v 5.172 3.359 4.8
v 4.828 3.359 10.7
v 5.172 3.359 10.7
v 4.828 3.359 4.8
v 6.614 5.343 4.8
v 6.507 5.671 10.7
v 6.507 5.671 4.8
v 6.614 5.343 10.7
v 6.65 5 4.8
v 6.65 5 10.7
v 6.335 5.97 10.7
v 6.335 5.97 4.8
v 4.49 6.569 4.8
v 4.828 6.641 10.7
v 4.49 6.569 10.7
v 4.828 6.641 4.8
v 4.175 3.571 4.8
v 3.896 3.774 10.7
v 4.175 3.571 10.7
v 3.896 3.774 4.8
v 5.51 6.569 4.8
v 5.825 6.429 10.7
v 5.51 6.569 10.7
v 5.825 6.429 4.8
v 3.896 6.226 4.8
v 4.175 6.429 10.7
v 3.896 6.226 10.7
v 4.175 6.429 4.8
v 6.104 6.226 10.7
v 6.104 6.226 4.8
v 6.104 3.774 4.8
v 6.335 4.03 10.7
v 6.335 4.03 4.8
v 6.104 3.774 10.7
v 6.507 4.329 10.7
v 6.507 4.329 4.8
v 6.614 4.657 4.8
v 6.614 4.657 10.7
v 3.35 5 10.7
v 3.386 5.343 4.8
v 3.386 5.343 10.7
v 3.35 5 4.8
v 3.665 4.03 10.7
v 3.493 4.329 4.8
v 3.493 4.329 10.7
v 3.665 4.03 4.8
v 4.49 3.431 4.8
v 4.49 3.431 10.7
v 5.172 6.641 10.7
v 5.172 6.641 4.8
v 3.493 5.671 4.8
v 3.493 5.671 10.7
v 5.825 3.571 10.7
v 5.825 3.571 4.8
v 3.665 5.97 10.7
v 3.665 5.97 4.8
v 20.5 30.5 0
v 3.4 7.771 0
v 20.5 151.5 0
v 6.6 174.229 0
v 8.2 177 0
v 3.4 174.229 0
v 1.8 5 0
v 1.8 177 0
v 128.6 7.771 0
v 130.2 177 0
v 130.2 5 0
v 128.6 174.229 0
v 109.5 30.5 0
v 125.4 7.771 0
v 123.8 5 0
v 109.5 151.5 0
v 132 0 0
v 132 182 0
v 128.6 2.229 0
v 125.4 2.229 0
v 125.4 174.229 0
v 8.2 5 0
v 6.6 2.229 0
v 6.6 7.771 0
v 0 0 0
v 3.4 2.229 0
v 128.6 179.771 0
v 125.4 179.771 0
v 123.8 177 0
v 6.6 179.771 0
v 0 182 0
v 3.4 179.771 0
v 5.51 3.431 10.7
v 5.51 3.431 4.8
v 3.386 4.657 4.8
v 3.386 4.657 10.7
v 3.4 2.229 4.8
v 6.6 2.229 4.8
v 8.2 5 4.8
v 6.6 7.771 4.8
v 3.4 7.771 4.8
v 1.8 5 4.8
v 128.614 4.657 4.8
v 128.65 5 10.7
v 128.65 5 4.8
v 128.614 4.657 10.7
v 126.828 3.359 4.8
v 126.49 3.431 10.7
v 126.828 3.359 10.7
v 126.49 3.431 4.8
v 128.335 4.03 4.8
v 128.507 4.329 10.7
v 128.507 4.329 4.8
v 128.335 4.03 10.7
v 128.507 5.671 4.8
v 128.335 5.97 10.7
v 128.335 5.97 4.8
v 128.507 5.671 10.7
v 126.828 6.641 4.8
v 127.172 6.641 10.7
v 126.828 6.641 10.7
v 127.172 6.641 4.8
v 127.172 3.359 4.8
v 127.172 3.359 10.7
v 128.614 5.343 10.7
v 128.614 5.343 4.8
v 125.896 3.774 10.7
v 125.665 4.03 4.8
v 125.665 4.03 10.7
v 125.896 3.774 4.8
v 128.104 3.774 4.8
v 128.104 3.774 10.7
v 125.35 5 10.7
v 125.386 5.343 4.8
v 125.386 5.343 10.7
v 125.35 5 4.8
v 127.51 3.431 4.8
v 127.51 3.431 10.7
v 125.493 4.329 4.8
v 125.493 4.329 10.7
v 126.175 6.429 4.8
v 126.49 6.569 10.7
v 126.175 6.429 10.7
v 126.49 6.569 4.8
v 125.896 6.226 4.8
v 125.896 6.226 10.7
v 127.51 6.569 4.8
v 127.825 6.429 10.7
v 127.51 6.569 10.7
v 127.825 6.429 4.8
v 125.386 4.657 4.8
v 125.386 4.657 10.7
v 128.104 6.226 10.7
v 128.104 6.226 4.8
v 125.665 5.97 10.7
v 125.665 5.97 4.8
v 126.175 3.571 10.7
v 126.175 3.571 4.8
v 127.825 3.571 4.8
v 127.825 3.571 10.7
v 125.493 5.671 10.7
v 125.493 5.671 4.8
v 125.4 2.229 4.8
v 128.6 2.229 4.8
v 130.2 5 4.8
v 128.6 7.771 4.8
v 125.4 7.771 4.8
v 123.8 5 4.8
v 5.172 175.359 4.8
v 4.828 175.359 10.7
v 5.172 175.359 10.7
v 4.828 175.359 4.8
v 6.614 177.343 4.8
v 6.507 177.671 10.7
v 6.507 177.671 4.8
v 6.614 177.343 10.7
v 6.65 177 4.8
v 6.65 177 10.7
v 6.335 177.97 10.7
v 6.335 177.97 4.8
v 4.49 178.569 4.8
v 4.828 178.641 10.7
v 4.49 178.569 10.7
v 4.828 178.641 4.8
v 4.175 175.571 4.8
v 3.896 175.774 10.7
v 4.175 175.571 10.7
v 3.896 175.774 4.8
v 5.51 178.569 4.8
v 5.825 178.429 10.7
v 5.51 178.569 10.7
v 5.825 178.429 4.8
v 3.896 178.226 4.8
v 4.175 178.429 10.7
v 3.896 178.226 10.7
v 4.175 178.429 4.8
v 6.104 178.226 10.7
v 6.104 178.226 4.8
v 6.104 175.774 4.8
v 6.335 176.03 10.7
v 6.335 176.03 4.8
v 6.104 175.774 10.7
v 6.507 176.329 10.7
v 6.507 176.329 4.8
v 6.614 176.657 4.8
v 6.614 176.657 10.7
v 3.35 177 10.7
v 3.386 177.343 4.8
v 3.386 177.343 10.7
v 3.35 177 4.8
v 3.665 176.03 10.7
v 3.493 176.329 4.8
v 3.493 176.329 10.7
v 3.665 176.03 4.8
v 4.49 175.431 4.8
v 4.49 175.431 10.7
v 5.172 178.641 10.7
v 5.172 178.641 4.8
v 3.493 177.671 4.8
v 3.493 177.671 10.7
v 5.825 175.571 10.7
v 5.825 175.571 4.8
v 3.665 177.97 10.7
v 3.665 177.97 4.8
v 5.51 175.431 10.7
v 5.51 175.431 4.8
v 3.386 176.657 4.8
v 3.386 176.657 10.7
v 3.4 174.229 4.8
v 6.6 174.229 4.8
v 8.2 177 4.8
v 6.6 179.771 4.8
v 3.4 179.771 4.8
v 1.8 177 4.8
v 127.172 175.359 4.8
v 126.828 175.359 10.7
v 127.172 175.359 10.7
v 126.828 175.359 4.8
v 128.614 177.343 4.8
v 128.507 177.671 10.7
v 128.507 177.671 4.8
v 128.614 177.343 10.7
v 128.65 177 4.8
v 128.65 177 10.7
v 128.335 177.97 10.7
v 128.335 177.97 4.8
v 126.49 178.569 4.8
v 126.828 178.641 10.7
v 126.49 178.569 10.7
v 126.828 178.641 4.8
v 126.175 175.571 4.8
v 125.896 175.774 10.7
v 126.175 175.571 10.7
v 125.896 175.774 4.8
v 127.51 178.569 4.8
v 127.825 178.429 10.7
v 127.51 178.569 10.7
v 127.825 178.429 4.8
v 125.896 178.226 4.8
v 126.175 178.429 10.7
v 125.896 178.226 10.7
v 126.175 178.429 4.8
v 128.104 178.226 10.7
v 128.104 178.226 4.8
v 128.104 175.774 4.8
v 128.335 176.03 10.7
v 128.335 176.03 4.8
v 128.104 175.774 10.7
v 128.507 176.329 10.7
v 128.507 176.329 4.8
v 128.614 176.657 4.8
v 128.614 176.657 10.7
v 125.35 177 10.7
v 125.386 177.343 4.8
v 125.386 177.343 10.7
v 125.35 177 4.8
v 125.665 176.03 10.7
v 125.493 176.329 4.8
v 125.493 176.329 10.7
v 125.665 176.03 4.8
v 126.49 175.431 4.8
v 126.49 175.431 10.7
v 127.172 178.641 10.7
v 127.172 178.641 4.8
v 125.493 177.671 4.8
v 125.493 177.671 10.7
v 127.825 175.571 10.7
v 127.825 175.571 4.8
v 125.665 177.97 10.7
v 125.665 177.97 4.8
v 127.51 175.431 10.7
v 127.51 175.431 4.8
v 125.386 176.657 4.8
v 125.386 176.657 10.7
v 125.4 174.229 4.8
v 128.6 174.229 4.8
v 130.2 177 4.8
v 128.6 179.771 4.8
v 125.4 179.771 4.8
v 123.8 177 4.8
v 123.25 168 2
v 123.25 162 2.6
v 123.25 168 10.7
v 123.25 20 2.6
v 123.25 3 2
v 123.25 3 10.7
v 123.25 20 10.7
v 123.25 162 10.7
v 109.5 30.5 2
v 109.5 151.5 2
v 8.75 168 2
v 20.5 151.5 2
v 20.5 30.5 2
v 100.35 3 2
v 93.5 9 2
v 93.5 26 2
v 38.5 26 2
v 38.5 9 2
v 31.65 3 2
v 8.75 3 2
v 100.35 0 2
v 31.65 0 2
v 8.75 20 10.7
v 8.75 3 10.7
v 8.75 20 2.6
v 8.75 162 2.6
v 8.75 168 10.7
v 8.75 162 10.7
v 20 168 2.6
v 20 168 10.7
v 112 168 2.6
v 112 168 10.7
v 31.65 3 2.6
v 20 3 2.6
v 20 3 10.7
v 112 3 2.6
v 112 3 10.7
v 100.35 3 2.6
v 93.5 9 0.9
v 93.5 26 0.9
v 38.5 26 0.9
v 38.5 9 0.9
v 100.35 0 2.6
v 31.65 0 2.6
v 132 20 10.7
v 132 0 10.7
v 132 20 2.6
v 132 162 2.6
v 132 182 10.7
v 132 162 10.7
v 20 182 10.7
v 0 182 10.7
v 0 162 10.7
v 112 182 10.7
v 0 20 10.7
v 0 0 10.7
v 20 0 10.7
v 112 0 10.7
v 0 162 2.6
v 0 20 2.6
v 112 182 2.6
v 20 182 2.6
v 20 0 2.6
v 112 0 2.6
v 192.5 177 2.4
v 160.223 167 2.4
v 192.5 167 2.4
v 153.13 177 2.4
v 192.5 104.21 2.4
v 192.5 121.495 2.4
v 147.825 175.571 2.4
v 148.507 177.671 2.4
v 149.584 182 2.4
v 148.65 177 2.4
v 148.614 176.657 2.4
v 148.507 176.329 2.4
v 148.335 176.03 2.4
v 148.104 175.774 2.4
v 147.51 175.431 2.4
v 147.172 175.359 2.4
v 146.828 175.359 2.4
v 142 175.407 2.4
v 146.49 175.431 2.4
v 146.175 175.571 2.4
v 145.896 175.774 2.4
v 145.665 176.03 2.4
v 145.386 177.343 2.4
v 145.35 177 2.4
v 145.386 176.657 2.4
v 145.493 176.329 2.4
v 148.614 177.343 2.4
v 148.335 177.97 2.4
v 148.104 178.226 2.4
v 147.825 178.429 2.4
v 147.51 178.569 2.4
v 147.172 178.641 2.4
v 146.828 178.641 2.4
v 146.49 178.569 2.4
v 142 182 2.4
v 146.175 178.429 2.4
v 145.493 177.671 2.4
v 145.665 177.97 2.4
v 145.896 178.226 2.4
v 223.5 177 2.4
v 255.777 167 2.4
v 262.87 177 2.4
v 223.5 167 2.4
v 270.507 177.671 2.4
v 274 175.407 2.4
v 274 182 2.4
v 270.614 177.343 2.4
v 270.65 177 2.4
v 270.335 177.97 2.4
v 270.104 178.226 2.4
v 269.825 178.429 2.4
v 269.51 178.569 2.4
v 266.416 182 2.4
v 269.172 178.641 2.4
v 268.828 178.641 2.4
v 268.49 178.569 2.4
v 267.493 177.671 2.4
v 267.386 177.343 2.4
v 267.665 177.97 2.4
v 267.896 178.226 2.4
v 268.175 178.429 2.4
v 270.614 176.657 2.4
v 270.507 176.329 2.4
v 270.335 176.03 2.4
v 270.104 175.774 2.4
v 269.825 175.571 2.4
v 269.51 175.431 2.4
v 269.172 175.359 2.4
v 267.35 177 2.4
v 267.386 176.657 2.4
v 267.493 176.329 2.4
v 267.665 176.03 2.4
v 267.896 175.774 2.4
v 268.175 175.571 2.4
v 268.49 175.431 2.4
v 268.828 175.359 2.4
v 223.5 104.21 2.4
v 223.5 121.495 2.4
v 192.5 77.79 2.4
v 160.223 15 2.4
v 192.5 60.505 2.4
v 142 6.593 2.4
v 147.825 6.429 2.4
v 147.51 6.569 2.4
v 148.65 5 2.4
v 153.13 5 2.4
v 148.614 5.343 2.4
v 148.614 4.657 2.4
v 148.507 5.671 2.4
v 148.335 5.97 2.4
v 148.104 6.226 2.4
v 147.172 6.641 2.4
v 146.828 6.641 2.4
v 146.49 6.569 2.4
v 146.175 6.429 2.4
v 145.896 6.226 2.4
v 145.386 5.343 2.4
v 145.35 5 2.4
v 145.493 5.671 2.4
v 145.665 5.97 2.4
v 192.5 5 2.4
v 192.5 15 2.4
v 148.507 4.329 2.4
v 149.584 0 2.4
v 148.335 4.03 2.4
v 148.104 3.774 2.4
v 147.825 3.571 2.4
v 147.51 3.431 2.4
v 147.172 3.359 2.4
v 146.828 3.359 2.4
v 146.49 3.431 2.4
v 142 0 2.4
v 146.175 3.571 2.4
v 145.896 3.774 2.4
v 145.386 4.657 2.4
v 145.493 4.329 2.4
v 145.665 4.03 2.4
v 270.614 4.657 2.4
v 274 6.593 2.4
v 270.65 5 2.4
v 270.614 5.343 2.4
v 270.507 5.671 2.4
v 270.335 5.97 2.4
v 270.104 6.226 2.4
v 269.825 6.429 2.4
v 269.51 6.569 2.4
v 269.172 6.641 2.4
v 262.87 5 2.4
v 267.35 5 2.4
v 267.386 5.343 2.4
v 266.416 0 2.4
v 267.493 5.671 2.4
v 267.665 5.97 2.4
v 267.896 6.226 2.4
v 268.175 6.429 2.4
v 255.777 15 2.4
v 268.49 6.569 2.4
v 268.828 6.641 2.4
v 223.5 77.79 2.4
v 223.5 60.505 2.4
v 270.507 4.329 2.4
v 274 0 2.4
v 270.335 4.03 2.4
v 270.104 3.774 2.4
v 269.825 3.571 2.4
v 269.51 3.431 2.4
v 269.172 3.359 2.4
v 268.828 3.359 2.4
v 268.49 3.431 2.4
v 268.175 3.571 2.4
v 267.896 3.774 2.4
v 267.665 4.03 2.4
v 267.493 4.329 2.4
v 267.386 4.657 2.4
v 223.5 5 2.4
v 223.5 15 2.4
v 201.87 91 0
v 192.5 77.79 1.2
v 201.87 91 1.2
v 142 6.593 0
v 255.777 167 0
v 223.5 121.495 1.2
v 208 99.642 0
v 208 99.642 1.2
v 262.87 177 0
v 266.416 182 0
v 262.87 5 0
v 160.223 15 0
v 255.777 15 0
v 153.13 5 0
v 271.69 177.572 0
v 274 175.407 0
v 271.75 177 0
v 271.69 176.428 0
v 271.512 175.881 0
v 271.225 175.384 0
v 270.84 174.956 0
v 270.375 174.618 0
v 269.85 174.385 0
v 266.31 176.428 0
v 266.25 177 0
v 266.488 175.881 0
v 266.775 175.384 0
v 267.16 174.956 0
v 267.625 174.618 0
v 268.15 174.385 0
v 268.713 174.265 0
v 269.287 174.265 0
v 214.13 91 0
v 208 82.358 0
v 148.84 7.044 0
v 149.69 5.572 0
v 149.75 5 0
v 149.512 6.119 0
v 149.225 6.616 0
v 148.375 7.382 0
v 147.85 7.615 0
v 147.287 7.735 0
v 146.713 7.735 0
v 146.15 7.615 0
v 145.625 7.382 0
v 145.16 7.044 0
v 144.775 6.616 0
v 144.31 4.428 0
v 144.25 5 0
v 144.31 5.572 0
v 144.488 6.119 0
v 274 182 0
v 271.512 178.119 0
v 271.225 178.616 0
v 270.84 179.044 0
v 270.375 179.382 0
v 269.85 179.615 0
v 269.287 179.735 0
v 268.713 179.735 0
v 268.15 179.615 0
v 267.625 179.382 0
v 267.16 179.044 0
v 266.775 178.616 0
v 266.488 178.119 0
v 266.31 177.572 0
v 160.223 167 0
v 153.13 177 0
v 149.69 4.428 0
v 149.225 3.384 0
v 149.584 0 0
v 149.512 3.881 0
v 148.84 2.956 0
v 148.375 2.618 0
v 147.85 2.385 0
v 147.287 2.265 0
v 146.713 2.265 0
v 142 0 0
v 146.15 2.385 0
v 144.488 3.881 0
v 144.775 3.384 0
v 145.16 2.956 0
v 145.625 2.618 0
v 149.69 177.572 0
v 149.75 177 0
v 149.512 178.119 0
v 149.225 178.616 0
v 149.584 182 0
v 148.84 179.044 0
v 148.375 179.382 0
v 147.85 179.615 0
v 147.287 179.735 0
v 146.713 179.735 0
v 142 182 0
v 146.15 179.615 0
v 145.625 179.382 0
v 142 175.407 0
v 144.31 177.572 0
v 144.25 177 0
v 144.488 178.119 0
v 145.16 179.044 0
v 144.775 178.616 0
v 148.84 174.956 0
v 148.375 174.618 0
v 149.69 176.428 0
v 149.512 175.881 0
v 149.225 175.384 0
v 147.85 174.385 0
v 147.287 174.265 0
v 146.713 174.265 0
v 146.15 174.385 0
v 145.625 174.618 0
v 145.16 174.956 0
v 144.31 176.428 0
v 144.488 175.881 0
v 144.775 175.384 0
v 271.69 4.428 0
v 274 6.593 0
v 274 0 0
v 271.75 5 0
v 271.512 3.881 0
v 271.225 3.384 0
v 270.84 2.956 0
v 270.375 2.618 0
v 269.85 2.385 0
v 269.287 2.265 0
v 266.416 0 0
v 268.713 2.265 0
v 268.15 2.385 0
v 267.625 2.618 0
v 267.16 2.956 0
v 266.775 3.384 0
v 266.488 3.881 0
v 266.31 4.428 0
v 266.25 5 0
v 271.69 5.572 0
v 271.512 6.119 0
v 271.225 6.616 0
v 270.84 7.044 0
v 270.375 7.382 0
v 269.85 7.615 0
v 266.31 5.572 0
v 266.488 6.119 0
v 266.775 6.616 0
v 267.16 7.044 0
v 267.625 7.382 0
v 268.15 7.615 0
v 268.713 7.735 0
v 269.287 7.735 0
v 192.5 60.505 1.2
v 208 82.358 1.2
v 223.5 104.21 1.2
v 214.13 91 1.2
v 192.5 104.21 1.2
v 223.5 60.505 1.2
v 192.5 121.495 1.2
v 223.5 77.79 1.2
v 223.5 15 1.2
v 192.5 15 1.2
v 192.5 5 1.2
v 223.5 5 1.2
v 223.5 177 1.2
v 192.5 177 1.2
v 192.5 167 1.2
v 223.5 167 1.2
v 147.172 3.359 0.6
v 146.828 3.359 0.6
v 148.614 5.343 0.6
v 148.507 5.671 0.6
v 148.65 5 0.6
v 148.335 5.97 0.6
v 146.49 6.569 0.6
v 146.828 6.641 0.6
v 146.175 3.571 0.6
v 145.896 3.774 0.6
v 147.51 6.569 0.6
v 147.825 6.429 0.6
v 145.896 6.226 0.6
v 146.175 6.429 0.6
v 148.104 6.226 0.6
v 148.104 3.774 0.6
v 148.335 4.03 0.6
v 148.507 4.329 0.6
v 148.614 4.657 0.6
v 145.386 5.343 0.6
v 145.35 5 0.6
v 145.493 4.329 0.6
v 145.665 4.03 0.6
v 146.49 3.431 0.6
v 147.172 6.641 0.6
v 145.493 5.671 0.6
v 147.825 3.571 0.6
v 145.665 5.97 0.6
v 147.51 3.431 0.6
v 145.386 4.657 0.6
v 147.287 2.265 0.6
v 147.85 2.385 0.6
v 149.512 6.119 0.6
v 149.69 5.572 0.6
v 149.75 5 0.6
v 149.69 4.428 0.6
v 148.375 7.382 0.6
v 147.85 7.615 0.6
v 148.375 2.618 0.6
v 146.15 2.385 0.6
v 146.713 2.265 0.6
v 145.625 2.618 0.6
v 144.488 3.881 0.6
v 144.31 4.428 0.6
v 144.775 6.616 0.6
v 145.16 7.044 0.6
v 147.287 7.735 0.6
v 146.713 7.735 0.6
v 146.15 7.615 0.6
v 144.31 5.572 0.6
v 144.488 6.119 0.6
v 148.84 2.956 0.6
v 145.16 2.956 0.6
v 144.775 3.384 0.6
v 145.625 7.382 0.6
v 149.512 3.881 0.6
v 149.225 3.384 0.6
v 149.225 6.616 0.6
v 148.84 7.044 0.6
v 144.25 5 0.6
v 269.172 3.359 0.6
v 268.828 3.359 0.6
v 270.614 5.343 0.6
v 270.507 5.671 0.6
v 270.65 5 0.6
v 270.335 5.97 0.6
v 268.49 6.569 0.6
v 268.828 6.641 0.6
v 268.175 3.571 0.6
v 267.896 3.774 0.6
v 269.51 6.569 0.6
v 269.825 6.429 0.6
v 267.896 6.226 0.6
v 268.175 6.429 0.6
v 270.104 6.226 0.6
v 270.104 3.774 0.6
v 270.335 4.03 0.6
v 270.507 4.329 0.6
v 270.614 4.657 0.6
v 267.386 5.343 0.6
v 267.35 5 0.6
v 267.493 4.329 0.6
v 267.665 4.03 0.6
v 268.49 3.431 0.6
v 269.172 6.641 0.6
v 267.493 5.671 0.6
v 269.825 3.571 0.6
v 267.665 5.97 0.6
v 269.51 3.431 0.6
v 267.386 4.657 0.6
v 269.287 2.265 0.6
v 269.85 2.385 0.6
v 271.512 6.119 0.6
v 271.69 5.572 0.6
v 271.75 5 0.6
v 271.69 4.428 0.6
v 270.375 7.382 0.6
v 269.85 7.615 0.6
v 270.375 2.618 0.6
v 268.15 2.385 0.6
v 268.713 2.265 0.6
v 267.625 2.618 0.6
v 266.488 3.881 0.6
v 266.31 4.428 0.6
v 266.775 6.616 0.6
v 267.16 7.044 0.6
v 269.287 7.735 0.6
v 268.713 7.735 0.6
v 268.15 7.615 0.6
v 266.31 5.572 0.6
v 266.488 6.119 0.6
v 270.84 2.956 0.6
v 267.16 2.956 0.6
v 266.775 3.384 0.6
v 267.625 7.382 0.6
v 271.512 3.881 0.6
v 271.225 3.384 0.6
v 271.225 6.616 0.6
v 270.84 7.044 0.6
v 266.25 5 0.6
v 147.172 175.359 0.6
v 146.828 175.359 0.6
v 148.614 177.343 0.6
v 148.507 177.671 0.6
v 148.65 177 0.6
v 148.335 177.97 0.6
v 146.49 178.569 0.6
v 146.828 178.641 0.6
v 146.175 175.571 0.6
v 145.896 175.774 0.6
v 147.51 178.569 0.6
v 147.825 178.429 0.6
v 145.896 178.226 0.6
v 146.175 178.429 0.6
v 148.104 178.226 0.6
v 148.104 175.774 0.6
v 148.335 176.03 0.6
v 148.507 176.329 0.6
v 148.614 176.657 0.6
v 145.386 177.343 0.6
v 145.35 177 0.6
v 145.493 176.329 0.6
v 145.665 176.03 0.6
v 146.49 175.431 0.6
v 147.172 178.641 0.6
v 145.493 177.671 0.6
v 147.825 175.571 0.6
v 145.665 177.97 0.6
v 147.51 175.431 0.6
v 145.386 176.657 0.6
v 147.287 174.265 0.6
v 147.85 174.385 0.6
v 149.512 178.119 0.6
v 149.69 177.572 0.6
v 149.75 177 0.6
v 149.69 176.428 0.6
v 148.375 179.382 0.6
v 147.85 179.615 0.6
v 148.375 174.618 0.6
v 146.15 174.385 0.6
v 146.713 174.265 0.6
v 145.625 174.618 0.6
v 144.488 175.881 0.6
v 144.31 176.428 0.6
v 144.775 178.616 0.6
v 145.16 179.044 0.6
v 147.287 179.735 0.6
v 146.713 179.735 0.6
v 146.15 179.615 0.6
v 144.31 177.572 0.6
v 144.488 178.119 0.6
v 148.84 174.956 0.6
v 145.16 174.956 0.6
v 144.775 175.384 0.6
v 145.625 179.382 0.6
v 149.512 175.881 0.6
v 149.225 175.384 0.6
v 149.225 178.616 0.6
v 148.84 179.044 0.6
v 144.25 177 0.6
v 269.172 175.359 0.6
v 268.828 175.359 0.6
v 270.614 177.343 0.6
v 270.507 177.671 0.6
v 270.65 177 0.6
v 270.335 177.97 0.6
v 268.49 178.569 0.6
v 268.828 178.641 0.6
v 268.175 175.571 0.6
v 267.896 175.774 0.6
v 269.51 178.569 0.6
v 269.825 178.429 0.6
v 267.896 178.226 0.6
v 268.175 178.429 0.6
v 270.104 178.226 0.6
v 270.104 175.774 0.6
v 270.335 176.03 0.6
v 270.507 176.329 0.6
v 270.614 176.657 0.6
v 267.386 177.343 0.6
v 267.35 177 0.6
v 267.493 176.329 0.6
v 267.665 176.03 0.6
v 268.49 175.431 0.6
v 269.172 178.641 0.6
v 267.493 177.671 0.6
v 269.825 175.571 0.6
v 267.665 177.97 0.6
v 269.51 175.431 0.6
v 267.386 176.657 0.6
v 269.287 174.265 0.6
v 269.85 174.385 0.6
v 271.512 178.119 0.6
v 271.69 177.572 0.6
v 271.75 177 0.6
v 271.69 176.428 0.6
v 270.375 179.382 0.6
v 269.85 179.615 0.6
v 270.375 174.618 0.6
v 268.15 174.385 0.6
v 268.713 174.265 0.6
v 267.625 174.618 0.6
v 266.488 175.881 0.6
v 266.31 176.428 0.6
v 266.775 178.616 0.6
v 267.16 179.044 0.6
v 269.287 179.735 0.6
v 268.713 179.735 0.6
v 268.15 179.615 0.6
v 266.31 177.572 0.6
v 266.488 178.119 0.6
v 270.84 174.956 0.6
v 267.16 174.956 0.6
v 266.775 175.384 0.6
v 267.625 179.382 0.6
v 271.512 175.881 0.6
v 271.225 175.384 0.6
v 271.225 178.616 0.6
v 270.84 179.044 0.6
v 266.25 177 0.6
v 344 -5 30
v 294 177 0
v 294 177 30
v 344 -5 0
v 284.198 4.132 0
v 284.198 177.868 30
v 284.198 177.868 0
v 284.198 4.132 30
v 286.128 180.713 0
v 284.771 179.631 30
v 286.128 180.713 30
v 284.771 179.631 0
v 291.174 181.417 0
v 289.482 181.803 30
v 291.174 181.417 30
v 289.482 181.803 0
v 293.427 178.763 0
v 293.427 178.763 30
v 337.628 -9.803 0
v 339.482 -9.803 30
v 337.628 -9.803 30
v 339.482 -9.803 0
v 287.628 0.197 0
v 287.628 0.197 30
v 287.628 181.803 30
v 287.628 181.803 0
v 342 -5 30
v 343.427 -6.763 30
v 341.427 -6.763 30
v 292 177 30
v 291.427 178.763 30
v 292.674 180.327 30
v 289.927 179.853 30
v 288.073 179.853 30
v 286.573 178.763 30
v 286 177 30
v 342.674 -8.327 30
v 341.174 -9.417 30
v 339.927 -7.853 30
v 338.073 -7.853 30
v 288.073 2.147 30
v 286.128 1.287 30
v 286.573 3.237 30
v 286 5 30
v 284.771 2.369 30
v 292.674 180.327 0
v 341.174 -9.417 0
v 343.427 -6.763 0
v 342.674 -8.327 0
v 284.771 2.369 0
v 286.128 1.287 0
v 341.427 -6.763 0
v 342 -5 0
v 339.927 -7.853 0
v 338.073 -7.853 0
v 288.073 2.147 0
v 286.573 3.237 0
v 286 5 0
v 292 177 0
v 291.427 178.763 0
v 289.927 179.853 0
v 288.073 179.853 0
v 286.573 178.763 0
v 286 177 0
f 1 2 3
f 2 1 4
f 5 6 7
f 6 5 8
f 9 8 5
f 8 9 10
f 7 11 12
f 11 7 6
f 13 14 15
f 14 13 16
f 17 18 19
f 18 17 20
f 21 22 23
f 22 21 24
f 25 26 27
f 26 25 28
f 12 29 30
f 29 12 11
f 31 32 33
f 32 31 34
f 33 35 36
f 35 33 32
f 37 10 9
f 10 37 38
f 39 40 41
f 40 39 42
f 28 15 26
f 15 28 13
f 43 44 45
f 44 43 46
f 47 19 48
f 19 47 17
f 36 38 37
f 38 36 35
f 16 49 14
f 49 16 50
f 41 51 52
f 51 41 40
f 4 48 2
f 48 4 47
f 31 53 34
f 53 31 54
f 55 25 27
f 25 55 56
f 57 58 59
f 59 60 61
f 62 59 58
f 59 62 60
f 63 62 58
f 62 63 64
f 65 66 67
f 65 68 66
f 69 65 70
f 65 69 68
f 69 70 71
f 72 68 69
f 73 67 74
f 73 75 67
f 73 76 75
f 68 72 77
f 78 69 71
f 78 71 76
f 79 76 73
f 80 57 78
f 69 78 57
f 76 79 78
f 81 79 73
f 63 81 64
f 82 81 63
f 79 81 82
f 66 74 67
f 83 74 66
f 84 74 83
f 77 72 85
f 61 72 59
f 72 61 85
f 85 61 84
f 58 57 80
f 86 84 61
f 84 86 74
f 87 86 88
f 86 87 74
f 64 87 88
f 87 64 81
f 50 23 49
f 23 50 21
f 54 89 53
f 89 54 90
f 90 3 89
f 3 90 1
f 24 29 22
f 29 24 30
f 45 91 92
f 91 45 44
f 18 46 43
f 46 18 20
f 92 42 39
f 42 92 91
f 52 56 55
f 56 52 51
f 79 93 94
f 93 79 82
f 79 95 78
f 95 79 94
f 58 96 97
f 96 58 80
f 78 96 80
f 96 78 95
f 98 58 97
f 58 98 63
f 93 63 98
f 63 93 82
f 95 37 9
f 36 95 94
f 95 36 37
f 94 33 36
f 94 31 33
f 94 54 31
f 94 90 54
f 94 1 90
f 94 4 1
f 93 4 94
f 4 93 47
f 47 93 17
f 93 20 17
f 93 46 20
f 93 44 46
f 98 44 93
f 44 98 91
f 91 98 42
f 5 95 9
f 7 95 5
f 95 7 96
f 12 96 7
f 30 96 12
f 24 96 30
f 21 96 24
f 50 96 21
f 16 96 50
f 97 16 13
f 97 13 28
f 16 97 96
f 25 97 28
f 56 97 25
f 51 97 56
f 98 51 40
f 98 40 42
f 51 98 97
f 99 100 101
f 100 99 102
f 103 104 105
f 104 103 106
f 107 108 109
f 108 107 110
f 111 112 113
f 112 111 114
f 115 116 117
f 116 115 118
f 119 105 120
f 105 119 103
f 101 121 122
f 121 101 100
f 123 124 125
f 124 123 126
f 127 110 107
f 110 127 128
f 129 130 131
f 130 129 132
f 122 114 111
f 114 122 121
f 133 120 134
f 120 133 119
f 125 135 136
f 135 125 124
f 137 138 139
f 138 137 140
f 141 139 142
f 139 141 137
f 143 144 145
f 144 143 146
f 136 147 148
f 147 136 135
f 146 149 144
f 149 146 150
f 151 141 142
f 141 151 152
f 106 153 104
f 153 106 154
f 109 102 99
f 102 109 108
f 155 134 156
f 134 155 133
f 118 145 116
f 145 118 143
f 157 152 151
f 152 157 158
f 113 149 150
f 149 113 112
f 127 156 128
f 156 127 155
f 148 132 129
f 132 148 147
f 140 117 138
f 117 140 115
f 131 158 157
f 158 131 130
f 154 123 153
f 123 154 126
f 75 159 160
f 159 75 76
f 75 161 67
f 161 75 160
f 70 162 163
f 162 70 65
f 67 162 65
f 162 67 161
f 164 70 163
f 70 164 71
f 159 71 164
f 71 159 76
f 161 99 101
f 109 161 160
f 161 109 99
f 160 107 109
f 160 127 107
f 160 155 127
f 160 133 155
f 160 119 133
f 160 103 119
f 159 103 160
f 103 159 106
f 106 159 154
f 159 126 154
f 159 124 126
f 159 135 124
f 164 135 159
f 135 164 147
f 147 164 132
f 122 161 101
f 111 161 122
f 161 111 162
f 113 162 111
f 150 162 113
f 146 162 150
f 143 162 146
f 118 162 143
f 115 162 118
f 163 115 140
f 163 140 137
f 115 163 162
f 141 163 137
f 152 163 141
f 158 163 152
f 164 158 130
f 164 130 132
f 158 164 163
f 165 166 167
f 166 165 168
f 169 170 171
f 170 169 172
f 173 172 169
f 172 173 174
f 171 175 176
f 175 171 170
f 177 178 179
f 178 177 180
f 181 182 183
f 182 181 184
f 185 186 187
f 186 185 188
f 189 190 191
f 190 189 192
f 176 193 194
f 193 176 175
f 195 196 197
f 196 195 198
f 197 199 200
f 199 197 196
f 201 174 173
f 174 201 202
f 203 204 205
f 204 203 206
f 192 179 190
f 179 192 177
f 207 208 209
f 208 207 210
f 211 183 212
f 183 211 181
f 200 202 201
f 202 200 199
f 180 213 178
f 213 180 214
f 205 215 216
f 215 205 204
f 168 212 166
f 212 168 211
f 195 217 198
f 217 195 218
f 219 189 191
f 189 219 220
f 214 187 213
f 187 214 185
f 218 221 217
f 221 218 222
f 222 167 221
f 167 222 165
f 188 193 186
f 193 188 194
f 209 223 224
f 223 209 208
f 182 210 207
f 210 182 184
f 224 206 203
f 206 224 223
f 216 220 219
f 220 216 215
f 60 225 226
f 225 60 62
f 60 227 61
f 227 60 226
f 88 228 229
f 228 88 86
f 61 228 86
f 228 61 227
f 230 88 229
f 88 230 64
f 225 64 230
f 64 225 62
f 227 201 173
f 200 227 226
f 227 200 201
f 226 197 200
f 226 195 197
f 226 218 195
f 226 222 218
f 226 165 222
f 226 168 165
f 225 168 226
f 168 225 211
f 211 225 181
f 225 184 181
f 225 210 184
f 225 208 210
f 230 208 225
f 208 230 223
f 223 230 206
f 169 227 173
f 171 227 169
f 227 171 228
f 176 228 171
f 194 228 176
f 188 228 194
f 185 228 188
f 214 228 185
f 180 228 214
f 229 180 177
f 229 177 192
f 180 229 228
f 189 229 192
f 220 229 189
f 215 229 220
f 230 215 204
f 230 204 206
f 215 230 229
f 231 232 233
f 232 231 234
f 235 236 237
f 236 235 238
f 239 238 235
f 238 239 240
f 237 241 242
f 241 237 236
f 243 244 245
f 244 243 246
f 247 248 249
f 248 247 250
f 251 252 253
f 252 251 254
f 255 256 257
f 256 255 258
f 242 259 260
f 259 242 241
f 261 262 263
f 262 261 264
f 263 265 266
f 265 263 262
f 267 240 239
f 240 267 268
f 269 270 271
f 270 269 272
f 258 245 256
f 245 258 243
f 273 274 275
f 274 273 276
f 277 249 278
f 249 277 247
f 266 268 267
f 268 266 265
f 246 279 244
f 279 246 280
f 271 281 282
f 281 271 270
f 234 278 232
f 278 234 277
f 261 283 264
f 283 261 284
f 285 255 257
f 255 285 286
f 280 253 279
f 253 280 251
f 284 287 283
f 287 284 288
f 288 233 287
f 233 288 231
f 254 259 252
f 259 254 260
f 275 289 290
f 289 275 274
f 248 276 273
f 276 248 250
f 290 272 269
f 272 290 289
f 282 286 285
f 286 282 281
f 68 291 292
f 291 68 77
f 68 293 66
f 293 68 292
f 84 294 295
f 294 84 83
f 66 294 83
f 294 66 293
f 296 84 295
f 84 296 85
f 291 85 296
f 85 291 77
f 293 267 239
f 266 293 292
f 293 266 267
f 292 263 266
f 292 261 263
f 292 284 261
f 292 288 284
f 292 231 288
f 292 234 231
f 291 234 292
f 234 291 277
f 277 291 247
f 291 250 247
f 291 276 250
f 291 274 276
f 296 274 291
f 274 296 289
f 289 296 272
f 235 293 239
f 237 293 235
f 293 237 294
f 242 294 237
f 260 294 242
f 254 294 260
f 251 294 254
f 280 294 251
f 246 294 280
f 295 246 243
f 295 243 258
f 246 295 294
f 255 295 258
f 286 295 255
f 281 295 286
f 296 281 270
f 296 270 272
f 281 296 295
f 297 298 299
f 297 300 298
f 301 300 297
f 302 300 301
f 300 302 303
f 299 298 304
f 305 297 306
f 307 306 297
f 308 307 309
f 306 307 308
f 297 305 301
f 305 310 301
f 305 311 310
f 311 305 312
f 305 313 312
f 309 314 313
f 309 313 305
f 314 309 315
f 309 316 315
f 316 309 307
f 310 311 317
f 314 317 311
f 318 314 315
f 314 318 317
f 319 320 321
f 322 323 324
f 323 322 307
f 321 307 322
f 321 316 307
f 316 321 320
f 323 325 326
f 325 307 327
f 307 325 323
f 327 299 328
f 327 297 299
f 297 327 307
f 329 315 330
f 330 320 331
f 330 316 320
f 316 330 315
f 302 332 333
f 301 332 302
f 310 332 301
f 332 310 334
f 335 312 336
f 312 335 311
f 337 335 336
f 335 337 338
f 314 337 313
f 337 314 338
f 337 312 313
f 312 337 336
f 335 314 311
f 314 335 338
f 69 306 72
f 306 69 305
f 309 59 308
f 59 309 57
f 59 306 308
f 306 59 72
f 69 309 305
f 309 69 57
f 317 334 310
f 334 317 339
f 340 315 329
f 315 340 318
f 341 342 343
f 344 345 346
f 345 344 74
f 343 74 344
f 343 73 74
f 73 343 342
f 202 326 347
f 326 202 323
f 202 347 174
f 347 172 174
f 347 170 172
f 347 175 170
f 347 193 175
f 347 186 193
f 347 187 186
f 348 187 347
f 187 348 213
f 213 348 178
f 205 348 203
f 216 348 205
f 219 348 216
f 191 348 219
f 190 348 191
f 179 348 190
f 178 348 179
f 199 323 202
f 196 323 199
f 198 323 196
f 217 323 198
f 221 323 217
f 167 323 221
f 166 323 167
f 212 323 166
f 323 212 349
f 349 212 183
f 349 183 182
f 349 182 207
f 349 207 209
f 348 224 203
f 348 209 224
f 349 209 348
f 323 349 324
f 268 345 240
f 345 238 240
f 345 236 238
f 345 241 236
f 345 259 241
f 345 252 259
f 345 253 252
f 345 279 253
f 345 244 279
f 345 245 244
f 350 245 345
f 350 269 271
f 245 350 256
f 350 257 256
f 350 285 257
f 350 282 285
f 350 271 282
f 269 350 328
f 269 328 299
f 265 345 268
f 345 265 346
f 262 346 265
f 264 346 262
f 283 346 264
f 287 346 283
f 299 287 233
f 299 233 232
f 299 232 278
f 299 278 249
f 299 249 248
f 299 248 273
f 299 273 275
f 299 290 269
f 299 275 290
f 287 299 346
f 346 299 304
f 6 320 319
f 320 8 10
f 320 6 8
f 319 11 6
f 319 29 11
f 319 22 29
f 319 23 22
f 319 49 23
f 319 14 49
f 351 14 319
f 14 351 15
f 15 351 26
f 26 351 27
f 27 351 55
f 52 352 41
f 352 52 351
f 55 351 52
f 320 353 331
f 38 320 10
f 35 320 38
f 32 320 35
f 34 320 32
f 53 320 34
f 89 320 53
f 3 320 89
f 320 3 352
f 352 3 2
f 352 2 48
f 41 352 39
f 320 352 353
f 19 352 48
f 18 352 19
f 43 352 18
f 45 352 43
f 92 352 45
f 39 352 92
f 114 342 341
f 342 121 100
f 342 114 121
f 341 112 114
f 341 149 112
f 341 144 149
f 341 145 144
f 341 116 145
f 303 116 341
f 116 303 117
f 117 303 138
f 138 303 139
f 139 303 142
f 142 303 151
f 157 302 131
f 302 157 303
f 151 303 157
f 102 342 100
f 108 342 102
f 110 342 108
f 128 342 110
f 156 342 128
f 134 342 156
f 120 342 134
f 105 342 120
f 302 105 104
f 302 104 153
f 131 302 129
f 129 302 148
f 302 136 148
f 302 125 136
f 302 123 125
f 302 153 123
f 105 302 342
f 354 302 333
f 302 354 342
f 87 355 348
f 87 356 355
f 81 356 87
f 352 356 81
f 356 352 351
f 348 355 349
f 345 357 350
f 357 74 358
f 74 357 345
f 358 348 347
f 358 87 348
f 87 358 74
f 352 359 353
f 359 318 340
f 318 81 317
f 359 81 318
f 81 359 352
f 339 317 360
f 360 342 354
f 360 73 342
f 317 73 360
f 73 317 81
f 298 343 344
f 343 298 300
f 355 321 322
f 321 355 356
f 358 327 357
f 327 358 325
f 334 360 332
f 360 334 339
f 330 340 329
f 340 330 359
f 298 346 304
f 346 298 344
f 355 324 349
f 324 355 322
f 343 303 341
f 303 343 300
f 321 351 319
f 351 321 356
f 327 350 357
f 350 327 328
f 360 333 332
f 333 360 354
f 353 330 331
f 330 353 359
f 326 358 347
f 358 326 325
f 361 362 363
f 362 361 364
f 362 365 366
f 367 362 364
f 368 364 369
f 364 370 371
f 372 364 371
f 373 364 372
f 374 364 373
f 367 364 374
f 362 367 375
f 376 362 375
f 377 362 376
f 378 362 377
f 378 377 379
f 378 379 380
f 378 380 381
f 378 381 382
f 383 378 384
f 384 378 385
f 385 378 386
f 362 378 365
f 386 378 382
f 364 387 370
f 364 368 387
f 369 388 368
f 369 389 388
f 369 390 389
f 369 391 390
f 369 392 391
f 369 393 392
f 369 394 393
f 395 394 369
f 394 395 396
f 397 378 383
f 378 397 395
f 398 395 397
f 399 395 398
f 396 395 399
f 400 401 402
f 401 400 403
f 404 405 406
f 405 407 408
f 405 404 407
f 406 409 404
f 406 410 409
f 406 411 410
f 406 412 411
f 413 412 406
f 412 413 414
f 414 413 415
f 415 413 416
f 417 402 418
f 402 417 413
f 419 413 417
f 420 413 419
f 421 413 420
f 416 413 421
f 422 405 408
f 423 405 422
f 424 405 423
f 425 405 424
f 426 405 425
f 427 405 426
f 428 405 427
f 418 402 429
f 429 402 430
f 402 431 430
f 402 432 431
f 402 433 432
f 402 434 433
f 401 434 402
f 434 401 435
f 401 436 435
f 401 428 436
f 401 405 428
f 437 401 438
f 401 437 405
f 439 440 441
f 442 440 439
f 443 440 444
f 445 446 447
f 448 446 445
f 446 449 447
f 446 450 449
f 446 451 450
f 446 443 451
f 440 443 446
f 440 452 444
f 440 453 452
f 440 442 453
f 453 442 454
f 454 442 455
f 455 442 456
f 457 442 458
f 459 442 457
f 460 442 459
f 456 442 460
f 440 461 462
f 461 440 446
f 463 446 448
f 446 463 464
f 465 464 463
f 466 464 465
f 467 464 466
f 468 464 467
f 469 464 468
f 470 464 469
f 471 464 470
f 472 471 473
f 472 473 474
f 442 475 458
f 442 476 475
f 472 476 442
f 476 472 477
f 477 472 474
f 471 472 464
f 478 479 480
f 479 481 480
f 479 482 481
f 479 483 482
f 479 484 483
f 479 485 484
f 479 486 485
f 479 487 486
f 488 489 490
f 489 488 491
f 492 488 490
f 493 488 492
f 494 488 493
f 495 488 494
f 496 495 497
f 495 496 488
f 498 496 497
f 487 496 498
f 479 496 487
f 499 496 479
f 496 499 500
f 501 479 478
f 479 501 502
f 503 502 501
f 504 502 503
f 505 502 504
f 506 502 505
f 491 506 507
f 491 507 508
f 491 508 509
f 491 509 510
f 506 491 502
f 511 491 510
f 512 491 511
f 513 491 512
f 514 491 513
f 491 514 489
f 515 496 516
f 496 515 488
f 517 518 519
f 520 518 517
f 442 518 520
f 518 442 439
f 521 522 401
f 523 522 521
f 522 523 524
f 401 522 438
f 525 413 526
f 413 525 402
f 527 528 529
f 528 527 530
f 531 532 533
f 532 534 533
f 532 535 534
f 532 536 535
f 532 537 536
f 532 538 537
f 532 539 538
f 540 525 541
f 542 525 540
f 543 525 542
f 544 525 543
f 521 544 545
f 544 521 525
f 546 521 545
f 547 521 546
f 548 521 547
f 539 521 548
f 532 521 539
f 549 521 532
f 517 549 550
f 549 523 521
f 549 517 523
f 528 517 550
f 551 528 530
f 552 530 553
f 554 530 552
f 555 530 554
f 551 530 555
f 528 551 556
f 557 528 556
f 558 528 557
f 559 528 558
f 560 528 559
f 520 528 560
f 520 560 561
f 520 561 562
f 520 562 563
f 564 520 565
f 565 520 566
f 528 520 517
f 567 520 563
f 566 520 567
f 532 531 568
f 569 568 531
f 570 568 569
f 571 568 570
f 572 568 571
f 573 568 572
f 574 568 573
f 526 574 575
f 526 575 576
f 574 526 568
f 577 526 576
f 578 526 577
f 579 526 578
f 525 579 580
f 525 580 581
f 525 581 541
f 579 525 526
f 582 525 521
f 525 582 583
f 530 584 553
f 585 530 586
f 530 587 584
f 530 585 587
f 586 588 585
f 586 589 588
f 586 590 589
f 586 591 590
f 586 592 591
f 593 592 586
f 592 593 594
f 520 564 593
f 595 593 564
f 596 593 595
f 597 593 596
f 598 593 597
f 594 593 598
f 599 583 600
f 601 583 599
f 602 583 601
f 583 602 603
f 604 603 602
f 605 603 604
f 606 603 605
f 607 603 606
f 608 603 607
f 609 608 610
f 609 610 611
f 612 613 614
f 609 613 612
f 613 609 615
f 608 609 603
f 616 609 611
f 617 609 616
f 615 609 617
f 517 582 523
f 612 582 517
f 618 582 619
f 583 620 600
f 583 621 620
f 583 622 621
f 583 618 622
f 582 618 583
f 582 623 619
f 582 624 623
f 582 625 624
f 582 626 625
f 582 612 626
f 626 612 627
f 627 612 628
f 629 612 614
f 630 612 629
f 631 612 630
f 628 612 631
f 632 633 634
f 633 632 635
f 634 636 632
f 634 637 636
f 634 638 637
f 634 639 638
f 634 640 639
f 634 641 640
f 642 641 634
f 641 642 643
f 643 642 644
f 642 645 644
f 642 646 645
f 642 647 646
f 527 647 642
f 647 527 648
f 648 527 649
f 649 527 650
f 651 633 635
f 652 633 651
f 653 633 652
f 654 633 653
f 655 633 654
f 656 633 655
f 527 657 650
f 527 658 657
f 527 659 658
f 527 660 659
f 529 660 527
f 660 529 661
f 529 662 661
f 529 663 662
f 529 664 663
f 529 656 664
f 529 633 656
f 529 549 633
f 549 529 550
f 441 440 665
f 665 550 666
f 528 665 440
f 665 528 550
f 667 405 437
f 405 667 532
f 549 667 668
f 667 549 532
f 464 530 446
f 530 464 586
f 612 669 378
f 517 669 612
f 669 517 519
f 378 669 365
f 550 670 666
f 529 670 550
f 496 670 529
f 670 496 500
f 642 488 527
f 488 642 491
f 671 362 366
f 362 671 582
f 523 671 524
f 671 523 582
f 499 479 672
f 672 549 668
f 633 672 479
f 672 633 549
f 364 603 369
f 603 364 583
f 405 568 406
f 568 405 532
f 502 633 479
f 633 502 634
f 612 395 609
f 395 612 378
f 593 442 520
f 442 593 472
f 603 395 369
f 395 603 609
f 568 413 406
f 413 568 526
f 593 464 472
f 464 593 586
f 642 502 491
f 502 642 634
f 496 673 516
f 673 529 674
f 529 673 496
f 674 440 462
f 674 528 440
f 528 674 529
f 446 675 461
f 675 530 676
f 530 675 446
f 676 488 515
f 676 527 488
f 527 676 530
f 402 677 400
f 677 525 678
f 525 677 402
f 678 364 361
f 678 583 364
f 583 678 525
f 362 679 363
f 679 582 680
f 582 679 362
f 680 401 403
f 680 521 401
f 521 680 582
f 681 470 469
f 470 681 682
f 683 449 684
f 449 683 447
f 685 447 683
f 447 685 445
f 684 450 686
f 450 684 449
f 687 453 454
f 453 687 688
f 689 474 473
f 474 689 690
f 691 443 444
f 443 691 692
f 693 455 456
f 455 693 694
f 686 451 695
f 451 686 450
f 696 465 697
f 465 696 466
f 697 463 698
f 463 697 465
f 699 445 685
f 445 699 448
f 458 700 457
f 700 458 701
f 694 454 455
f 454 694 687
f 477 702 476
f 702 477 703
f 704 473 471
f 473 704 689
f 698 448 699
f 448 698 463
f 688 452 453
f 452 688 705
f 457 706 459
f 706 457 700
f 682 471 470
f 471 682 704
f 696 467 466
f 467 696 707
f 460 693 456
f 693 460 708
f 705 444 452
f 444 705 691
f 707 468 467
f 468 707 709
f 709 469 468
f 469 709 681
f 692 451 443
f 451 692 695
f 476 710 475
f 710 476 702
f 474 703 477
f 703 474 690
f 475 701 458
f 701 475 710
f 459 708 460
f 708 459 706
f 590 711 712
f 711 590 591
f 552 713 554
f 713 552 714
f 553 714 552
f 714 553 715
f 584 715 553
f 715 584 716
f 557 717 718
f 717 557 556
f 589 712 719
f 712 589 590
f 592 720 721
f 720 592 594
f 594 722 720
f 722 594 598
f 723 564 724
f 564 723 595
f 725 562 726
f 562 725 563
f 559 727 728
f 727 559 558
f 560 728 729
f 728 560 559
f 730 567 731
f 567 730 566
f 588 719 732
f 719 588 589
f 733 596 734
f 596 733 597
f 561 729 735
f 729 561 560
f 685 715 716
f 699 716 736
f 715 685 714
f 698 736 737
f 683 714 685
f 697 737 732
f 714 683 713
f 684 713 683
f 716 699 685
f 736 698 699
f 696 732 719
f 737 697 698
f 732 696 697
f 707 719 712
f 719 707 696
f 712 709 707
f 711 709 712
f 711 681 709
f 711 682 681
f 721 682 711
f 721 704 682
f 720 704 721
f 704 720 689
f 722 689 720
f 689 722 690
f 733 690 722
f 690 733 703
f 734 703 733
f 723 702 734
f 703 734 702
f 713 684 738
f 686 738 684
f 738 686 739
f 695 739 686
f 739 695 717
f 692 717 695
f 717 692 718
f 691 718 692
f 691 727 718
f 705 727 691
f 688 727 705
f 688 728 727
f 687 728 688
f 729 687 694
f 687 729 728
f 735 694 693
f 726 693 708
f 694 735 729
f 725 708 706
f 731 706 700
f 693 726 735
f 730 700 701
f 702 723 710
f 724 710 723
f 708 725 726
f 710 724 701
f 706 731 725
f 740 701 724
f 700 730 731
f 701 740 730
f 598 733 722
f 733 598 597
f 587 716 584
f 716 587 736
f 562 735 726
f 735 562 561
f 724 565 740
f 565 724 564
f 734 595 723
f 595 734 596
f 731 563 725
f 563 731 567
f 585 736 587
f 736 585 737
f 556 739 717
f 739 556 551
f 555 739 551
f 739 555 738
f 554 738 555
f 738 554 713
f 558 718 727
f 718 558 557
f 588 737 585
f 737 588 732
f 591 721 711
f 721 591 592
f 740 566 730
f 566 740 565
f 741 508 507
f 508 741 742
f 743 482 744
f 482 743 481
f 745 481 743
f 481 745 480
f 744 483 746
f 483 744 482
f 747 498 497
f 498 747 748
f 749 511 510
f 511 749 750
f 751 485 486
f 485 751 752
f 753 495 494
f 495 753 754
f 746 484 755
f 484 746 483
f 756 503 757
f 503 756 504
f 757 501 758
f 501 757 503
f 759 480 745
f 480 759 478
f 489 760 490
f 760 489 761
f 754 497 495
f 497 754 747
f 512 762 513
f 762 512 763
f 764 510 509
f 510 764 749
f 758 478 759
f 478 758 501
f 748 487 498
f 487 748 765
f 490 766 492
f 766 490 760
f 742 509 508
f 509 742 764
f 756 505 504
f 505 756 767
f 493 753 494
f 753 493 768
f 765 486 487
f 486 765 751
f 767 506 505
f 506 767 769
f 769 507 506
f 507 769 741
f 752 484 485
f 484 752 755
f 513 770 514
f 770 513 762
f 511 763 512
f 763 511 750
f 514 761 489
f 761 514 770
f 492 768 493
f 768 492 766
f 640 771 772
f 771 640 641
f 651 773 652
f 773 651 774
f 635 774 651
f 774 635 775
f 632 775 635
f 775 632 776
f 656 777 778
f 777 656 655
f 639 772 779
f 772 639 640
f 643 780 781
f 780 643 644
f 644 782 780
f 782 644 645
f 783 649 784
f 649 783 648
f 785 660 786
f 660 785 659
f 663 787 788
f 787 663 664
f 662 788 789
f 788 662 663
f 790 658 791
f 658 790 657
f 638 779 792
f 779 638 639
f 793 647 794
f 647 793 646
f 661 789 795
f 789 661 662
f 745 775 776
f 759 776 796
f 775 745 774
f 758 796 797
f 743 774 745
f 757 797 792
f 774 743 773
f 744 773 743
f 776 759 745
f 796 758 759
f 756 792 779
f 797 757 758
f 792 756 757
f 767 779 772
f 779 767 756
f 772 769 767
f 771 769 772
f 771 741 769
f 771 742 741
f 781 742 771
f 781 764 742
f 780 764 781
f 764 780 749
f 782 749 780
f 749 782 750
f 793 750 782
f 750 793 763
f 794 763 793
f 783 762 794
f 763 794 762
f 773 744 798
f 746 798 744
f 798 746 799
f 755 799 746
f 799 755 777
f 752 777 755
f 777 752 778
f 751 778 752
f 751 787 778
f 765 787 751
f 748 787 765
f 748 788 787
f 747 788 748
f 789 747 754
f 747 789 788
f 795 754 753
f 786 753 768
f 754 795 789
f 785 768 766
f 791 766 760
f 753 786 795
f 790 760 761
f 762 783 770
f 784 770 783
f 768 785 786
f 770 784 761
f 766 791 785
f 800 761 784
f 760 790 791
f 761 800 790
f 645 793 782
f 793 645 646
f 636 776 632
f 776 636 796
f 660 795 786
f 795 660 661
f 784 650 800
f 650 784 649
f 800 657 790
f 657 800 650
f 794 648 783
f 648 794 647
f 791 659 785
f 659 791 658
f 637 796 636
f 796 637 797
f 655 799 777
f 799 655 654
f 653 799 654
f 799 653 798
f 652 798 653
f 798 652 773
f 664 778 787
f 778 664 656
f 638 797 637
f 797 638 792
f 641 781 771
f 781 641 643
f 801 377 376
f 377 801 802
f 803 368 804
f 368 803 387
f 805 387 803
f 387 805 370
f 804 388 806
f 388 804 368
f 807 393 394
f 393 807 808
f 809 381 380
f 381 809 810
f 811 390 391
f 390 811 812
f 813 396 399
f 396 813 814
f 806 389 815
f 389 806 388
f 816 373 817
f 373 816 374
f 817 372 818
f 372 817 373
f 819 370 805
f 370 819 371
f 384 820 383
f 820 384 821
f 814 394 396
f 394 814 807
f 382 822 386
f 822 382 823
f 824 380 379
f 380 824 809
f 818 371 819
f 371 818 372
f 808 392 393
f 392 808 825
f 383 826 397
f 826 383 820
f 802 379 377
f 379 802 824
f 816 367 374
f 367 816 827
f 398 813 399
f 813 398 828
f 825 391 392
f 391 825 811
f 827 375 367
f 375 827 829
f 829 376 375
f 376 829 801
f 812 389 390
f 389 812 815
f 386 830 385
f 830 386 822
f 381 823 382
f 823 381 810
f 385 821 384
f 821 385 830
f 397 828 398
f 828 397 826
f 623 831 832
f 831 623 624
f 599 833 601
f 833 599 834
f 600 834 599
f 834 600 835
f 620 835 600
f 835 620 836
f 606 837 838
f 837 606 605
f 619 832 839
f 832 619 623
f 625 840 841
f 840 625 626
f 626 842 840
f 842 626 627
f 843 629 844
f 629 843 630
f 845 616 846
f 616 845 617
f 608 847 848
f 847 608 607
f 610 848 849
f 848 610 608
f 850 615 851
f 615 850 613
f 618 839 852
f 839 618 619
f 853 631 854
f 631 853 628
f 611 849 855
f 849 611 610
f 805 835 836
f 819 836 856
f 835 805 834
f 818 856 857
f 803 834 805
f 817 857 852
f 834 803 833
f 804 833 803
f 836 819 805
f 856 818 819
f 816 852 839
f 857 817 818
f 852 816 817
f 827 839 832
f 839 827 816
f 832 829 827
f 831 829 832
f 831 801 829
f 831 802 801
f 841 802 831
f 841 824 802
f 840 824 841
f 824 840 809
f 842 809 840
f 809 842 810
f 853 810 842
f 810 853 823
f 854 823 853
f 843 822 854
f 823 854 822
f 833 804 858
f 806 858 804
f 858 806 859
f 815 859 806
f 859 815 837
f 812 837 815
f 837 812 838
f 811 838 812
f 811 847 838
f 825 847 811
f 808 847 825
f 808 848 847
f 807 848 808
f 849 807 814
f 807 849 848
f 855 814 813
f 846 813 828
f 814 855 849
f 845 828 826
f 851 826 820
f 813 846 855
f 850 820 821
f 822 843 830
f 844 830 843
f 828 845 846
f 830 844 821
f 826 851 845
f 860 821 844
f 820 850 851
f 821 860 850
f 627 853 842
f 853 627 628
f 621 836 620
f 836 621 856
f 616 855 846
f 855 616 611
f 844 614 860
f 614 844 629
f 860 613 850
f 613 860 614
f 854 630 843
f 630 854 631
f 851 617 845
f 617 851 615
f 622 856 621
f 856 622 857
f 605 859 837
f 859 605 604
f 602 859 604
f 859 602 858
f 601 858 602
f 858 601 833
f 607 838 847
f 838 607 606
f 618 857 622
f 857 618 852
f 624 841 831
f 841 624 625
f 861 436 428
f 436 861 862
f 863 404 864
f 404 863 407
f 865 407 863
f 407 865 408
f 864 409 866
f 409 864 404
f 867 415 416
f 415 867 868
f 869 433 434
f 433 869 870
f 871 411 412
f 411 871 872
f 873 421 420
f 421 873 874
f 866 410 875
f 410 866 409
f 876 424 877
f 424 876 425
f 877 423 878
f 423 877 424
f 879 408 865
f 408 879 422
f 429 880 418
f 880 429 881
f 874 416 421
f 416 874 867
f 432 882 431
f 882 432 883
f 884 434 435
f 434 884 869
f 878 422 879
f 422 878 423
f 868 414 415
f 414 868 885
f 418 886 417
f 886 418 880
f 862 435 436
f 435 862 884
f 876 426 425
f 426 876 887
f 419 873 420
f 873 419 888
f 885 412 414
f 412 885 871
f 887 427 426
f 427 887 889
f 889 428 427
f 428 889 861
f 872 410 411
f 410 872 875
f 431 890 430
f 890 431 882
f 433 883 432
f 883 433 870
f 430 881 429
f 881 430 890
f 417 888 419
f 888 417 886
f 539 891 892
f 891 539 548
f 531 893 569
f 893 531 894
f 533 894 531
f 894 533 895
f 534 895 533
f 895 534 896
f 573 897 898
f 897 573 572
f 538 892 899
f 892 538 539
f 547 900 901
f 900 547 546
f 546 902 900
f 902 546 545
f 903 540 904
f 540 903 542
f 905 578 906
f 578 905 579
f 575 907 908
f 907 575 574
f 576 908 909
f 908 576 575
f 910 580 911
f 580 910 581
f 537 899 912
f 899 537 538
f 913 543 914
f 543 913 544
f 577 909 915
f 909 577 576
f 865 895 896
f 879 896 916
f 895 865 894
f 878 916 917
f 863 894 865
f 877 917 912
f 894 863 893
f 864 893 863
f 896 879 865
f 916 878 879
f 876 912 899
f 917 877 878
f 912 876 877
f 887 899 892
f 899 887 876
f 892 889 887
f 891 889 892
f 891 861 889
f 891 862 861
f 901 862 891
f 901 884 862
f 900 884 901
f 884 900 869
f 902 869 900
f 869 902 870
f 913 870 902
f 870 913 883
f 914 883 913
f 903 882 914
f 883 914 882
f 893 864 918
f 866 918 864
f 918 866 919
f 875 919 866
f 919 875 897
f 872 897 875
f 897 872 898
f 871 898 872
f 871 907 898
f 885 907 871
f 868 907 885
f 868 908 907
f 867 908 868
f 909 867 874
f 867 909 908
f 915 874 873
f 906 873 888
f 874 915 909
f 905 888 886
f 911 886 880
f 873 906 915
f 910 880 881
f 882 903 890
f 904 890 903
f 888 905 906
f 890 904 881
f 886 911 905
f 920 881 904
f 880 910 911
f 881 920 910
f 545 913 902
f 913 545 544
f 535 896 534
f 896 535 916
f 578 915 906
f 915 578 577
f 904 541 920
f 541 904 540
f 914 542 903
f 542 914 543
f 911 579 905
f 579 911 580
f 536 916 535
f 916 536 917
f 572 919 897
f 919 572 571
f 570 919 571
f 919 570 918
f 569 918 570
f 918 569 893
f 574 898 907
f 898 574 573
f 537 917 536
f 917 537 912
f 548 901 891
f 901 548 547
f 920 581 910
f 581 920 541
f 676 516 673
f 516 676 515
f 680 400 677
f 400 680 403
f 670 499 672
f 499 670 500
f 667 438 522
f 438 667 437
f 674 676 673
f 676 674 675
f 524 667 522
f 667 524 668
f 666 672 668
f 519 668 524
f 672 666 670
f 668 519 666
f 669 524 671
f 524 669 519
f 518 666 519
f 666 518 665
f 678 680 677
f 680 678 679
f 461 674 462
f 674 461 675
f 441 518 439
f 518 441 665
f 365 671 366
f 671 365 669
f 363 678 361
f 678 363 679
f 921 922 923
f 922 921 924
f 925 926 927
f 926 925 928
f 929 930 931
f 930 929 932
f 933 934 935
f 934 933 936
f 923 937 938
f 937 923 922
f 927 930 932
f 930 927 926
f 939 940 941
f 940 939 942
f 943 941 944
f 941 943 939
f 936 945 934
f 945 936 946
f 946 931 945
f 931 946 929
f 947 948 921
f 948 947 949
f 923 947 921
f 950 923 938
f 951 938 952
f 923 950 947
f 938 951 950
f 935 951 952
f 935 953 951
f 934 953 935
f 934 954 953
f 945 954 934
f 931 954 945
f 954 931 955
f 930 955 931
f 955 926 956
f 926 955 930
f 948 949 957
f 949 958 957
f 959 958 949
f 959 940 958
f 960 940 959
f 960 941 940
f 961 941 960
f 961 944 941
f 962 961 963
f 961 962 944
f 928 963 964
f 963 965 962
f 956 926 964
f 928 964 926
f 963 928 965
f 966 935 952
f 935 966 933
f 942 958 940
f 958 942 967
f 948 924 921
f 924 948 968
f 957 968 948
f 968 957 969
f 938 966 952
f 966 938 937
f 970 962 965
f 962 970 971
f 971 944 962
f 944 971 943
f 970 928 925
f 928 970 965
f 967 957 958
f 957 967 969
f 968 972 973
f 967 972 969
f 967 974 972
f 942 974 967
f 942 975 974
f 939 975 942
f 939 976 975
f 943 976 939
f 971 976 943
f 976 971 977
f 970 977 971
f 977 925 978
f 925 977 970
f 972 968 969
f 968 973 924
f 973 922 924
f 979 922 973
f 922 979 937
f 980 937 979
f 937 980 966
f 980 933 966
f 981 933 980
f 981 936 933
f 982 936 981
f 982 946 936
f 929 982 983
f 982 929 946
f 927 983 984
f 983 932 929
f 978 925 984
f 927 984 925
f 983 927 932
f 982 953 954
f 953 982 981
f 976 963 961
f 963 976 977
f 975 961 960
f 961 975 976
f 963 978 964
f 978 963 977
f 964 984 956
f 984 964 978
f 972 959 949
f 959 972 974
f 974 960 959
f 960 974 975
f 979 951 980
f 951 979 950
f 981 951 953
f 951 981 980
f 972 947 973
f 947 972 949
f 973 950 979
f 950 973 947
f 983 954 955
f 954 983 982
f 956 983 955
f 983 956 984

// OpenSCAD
kindle_w=114.5;
kindle_h=165;
kindle_d=8.8;

kindle_screen_w=90;
kindle_screen_h=122;

kindle_screen_offset=27;
kindle_offset=(kindle_screen_offset - (kindle_h - kindle_screen_h - kindle_screen_offset))/2;

kindle_buttons_w=55;
kindle_buttons_h=17;
kindle_buttons_d=1.1;

kindle_buttons_offset=6;

inner_frame_w=132;
inner_frame_h=182;
inner_frame_t=0.3*3;
inner_frame_blocker_t=2.6;
glass_t=2;
inner_frame_d=kindle_d + kindle_buttons_d + inner_frame_t;

blocker_t=0.3*8;

screw_distance=5;
screw_d=4;

screws=[
  [screw_distance, screw_distance, 0],
  [inner_frame_w - screw_distance, screw_distance, 0],
  [screw_distance, inner_frame_h - screw_distance, 0],
  [inner_frame_w - screw_distance, inner_frame_h - screw_distance, 0]
];

print=false;
open=false;
device=true;
part="";

if(print) {
  if(part=="inner_frame")
  inner_frame();

  if(part=="blocker")
  blocker();
  
  if(part=="back")
  back();
}
else
{
  inner_frame();

  translate([inner_frame_w + 10, 0, 0])
  blocker();
  
  translate([(inner_frame_w + 10)*2, 0, 0])
  back();
}

back_w=30;
back_r=3;
back_d=60;
back_h=inner_frame_h;
back_t=2;

module back() {
  difference() {
    minkowski(){
      translate([back_t ,back_t , 0])
      cylinder(r=back_t, h=1);
      _back(back_w-1);
    }
    
    translate([back_t ,back_t , 0])
    _back(back_w);
  }
}

module _back(h) {
  translate([back_r ,back_r , 0])
  hull() {
    for(i = [
      [0, 0, 0],
      [0, back_h - 2*back_r - 2*back_t, 0],
      [back_d - 2*back_r - 2*back_t, -10, 0],
      ]) {
      translate(i)
      cylinder(r=back_r, h=h);
    }
  }
}

module blocker() {
  difference() {
    union() {
      _cross();
      
      translate([1.25*screw_distance, screw_distance, 0])
      cube([inner_frame_w - 2.5*screw_distance, 2*screw_distance, blocker_t]);
      
      translate([1.25*screw_distance, inner_frame_h - 3*screw_distance, 0])
      cube([inner_frame_w - 2.5*screw_distance, 2*screw_distance, blocker_t]);
    }
    
    for(screw = screws) {
      translate(screw) {
        cylinder(r=1.65, h=inner_frame_d, $fn=30);
        cylinder(d=5.5, h=0.6, $fn=30);
      }
    };
    
    translate([(inner_frame_w - back_w - 1)/2, screw_distance, blocker_t / 2])
    cube([back_w + 1, inner_frame_h, blocker_t / 2]);
  }
}

module _cross() {
  intersection() {
    cube([inner_frame_w, inner_frame_h, blocker_t]);
  
    difference() {
      union() {
        translate([screw_distance, screw_distance, 0])
        rotate([0, 0, atan((inner_frame_h - 2*screw_distance) / (inner_frame_w - 2*screw_distance))])
        translate([-screw_distance * 2, -screw_distance, 0])
        cube([inner_frame_w * 2, 2*screw_distance, blocker_t]);
        
        translate([inner_frame_w, 0, 0])
        mirror([1,0,0])
        translate([screw_distance, screw_distance, 0])
        rotate([0, 0, atan((inner_frame_h - 2*screw_distance) / (inner_frame_w - 2*screw_distance))])
        translate([-screw_distance * 2, -screw_distance, 0])
        cube([inner_frame_w * 2, 2*screw_distance, blocker_t]);
      }
    }
  }
}

module inner_frame() {  
  difference() {
    cube([inner_frame_w, inner_frame_h, inner_frame_d-0.1]);
    
    translate([0, 4*screw_distance, inner_frame_blocker_t])
    cube([inner_frame_w, inner_frame_h - 8*screw_distance, inner_frame_d]);
    
    translate([4*screw_distance, 0, inner_frame_blocker_t])
    cube([inner_frame_w - 8*screw_distance, inner_frame_h, inner_frame_d]);
        
    for(screw = screws) {
      translate(screw) {
        cylinder(r=1.65, h=inner_frame_d, $fn=30);
        cylinder(r=3.2, h=inner_frame_d-6, $fn=6);
      }
    };
    
    translate([(inner_frame_w - kindle_w)/2, (inner_frame_h - kindle_h)/2 - kindle_offset, inner_frame_t])
    kindle(); 
  }
}

screen_tolerance=1;
module kindle() {
  union() {
    // body
    translate([0, 0, kindle_buttons_d])
    cube([kindle_w, kindle_h, kindle_d]);
    
    // buttons
    translate([(kindle_w - kindle_buttons_w)/2, kindle_buttons_offset, 0])
    cube([kindle_buttons_w, kindle_buttons_h, kindle_buttons_d]);
    
    // screen 
    translate([(kindle_w - kindle_screen_w - screen_tolerance)/2, kindle_screen_offset +    screen_tolerance/2, -1])
    cube([kindle_screen_w - screen_tolerance, kindle_screen_h-screen_tolerance, kindle_buttons_d + 1]);
    
    // holes
    translate([(kindle_w - kindle_w * 0.6)/2, -10, kindle_buttons_d])
    cube([kindle_w * 0.6, 20, kindle_d]);
  }
}
